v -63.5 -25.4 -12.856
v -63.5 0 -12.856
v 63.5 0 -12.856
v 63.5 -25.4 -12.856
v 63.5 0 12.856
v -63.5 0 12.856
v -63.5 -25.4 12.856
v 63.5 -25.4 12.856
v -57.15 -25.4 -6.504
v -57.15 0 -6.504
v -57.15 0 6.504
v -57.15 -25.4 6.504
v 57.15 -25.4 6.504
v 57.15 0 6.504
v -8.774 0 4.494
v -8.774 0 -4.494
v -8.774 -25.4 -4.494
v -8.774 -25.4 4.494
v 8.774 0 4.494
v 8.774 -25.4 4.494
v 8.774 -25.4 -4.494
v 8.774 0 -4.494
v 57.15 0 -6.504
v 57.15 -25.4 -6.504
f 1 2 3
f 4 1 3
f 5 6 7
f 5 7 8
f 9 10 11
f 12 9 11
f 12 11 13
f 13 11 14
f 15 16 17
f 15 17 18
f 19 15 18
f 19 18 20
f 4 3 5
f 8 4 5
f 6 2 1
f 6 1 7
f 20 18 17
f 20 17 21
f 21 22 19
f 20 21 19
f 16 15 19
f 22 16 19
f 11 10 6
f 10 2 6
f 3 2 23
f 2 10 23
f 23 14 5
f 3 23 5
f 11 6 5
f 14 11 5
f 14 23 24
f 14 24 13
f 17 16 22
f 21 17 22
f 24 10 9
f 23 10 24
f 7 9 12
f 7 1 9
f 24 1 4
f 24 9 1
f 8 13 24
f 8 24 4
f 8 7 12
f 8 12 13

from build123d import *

# Parameters (mm, degrees)
F0_W     = 127
F0_H     = 25.712098
F0_W_2   = 114.3
F0_H_2   = 13.007298
F1_DEPTH = 25.4
F2_W     = 17.547922
F2_H     = 8.987962
F3_DEPTH = 25.4


with BuildPart() as f1:
    # F0 (on Front) → F1 (new body)
    with BuildSketch(Plane.XZ):
        Rectangle(F0_W, F0_H)
        Rectangle(F0_W_2, F0_H_2, mode=Mode.SUBTRACT)
    extrude(amount=F1_DEPTH)


with BuildPart() as f3:
    # F2 (on Front) → F3 (new body)
    with BuildSketch(Plane.XZ):
        Rectangle(F2_W, F2_H)
    extrude(amount=F3_DEPTH)


solid = Compound([f1.part, f3.part])
